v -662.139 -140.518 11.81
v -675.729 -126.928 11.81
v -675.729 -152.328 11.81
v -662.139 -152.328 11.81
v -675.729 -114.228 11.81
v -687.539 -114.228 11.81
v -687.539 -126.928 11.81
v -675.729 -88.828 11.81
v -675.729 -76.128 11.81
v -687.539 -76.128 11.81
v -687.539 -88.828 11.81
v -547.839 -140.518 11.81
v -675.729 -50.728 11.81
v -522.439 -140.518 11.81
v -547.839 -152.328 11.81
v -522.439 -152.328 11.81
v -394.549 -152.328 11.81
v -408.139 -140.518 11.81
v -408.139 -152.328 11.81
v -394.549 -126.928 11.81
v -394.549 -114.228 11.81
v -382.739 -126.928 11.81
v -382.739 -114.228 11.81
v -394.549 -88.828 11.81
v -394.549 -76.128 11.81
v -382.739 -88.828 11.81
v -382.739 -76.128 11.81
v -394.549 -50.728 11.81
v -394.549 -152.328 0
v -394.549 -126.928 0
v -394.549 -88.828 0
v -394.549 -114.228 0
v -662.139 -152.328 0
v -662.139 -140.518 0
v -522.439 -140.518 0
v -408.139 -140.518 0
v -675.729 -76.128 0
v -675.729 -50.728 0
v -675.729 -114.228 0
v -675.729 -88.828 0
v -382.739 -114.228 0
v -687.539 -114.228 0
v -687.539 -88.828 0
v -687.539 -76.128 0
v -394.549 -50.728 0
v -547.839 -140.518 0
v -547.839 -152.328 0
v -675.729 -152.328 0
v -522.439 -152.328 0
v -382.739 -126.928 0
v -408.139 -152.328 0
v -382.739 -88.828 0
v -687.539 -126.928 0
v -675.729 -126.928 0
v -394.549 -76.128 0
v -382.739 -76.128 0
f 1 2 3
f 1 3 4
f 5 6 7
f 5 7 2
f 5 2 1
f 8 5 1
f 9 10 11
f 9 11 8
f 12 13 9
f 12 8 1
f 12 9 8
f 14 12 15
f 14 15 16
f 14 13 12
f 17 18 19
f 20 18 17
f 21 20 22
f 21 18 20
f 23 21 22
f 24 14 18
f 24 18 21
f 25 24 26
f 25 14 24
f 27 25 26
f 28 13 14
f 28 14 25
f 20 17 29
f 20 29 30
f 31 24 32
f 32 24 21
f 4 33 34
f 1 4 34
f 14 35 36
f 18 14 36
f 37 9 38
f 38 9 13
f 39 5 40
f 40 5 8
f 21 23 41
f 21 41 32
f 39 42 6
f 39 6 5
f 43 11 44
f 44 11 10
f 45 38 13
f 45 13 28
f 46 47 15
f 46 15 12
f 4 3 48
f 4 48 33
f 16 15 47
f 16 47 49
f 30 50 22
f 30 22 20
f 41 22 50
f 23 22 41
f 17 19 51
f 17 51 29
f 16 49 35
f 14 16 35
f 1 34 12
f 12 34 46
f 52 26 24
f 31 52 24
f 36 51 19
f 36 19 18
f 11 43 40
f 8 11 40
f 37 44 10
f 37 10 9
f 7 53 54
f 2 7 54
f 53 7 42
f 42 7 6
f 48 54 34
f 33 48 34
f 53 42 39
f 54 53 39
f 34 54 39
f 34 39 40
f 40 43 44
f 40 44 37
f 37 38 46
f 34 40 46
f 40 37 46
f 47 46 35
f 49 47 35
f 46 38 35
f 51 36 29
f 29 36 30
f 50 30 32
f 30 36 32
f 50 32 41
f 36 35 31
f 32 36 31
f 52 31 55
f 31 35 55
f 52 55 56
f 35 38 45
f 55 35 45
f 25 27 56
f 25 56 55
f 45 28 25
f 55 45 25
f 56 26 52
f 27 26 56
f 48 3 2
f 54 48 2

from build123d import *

# Parameters (mm, degrees)
BASE_SKETCH_W           = 304.8
BASE_SKETCH_H           = 89.79
BOSS_EXTRUDE1_DEPTH     = 11.81
JOINT_X_W               = 25.4
JOINT_X_H               = 11.81
BOSS_EXTRUDE2_DEPTH     = 11.81
JOINT_Y_W               = 11.81
JOINT_Y_H               = 25.4
CUT_EXTRUDE1_DEPTH      = 705.310070992
LPATTERN1_COUNT         = 3
LPATTERN1_PITCH         = 139.7
LPATTERN2_COUNT         = 3
LPATTERN2_PITCH         = 38.1
MIRROR1_COPY_1_SKETCH_W = 11.81
MIRROR1_COPY_1_SKETCH_H = 25.4
MIRROR1_COPY_1_DEPTH    = 705.310070992
MIRROR1_COPY_2_SKETCH_W = 11.81
MIRROR1_COPY_2_SKETCH_H = 25.4
MIRROR1_COPY_2_DEPTH    = 705.310070992


with BuildPart() as part:
    # Base_Sketch → Boss-Extrude1 (new body)
    with BuildSketch(Plane.XY):
        with Locations((-535.138681284, -95.622810132)):
            Rectangle(BASE_SKETCH_W, BASE_SKETCH_H)
    extrude(amount=BOSS_EXTRUDE1_DEPTH)

    # Joint_X → Boss-Extrude2 (add)
    with BuildSketch(Plane.XY.offset(11.81)):
        with Locations((-674.838681284, -146.422810132)):
            Rectangle(JOINT_X_W, JOINT_X_H)
    boss_extrude2 = extrude(amount=-BOSS_EXTRUDE2_DEPTH)

    # Joint_Y → Cut-Extrude1 (cut, through all)
    with BuildSketch(Plane.XY.offset(11.81)):
        with Locations((-681.633681284, -139.627810132)):
            Rectangle(JOINT_Y_W, JOINT_Y_H)
    cut_extrude1 = extrude(amount=-CUT_EXTRUDE1_DEPTH, mode=Mode.SUBTRACT)

    # LPattern1: Boss-Extrude2 ×3
    with Locations(*[(i * LPATTERN1_PITCH, 0, 0) for i in range(1, LPATTERN1_COUNT)]):
        add(boss_extrude2)

    # LPattern2: Cut-Extrude1 ×3
    with Locations(*[(0, i * LPATTERN2_PITCH, 0) for i in range(1, LPATTERN2_COUNT)]):
        add(cut_extrude1, mode=Mode.SUBTRACT)

    # Mirror1: Cut-Extrude1 across plane
    add(cut_extrude1.mirror(Plane.ZY.offset(535.138681284)), mode=Mode.SUBTRACT)

    # Mirror1 copy 1 sketch → Mirror1 copy 1 (cut, through all)
    with BuildSketch(Plane(origin=(-1070.277362567, 38.1, 11.81), x_dir=(-1, 0, 0), z_dir=(0, 0, 1))):
        with Locations((-681.633681284, 139.627810132)):
            Rectangle(MIRROR1_COPY_1_SKETCH_W, MIRROR1_COPY_1_SKETCH_H)
    extrude(amount=-MIRROR1_COPY_1_DEPTH, mode=Mode.SUBTRACT)

    # Mirror1 copy 2 sketch → Mirror1 copy 2 (cut, through all)
    with BuildSketch(Plane(origin=(-1070.277362567, 76.2, 11.81), x_dir=(-1, 0, 0), z_dir=(0, 0, 1))):
        with Locations((-681.633681284, 139.627810132)):
            Rectangle(MIRROR1_COPY_2_SKETCH_W, MIRROR1_COPY_2_SKETCH_H)
    extrude(amount=-MIRROR1_COPY_2_DEPTH, mode=Mode.SUBTRACT)


solid = part.part
